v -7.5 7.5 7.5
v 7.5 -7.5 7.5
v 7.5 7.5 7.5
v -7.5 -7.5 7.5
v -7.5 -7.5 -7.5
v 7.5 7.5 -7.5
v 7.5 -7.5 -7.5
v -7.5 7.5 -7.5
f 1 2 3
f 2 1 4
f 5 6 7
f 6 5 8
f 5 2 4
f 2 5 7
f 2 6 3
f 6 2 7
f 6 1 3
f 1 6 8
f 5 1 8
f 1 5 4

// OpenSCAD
cube(15,center=true);
//translate([0,0,0])rotate([0,-45,-45])cube([30,30,5],center=true);
//rotate([0,-45,-45])translate([0,0,12.5])cube([30,30,20],center=true);
